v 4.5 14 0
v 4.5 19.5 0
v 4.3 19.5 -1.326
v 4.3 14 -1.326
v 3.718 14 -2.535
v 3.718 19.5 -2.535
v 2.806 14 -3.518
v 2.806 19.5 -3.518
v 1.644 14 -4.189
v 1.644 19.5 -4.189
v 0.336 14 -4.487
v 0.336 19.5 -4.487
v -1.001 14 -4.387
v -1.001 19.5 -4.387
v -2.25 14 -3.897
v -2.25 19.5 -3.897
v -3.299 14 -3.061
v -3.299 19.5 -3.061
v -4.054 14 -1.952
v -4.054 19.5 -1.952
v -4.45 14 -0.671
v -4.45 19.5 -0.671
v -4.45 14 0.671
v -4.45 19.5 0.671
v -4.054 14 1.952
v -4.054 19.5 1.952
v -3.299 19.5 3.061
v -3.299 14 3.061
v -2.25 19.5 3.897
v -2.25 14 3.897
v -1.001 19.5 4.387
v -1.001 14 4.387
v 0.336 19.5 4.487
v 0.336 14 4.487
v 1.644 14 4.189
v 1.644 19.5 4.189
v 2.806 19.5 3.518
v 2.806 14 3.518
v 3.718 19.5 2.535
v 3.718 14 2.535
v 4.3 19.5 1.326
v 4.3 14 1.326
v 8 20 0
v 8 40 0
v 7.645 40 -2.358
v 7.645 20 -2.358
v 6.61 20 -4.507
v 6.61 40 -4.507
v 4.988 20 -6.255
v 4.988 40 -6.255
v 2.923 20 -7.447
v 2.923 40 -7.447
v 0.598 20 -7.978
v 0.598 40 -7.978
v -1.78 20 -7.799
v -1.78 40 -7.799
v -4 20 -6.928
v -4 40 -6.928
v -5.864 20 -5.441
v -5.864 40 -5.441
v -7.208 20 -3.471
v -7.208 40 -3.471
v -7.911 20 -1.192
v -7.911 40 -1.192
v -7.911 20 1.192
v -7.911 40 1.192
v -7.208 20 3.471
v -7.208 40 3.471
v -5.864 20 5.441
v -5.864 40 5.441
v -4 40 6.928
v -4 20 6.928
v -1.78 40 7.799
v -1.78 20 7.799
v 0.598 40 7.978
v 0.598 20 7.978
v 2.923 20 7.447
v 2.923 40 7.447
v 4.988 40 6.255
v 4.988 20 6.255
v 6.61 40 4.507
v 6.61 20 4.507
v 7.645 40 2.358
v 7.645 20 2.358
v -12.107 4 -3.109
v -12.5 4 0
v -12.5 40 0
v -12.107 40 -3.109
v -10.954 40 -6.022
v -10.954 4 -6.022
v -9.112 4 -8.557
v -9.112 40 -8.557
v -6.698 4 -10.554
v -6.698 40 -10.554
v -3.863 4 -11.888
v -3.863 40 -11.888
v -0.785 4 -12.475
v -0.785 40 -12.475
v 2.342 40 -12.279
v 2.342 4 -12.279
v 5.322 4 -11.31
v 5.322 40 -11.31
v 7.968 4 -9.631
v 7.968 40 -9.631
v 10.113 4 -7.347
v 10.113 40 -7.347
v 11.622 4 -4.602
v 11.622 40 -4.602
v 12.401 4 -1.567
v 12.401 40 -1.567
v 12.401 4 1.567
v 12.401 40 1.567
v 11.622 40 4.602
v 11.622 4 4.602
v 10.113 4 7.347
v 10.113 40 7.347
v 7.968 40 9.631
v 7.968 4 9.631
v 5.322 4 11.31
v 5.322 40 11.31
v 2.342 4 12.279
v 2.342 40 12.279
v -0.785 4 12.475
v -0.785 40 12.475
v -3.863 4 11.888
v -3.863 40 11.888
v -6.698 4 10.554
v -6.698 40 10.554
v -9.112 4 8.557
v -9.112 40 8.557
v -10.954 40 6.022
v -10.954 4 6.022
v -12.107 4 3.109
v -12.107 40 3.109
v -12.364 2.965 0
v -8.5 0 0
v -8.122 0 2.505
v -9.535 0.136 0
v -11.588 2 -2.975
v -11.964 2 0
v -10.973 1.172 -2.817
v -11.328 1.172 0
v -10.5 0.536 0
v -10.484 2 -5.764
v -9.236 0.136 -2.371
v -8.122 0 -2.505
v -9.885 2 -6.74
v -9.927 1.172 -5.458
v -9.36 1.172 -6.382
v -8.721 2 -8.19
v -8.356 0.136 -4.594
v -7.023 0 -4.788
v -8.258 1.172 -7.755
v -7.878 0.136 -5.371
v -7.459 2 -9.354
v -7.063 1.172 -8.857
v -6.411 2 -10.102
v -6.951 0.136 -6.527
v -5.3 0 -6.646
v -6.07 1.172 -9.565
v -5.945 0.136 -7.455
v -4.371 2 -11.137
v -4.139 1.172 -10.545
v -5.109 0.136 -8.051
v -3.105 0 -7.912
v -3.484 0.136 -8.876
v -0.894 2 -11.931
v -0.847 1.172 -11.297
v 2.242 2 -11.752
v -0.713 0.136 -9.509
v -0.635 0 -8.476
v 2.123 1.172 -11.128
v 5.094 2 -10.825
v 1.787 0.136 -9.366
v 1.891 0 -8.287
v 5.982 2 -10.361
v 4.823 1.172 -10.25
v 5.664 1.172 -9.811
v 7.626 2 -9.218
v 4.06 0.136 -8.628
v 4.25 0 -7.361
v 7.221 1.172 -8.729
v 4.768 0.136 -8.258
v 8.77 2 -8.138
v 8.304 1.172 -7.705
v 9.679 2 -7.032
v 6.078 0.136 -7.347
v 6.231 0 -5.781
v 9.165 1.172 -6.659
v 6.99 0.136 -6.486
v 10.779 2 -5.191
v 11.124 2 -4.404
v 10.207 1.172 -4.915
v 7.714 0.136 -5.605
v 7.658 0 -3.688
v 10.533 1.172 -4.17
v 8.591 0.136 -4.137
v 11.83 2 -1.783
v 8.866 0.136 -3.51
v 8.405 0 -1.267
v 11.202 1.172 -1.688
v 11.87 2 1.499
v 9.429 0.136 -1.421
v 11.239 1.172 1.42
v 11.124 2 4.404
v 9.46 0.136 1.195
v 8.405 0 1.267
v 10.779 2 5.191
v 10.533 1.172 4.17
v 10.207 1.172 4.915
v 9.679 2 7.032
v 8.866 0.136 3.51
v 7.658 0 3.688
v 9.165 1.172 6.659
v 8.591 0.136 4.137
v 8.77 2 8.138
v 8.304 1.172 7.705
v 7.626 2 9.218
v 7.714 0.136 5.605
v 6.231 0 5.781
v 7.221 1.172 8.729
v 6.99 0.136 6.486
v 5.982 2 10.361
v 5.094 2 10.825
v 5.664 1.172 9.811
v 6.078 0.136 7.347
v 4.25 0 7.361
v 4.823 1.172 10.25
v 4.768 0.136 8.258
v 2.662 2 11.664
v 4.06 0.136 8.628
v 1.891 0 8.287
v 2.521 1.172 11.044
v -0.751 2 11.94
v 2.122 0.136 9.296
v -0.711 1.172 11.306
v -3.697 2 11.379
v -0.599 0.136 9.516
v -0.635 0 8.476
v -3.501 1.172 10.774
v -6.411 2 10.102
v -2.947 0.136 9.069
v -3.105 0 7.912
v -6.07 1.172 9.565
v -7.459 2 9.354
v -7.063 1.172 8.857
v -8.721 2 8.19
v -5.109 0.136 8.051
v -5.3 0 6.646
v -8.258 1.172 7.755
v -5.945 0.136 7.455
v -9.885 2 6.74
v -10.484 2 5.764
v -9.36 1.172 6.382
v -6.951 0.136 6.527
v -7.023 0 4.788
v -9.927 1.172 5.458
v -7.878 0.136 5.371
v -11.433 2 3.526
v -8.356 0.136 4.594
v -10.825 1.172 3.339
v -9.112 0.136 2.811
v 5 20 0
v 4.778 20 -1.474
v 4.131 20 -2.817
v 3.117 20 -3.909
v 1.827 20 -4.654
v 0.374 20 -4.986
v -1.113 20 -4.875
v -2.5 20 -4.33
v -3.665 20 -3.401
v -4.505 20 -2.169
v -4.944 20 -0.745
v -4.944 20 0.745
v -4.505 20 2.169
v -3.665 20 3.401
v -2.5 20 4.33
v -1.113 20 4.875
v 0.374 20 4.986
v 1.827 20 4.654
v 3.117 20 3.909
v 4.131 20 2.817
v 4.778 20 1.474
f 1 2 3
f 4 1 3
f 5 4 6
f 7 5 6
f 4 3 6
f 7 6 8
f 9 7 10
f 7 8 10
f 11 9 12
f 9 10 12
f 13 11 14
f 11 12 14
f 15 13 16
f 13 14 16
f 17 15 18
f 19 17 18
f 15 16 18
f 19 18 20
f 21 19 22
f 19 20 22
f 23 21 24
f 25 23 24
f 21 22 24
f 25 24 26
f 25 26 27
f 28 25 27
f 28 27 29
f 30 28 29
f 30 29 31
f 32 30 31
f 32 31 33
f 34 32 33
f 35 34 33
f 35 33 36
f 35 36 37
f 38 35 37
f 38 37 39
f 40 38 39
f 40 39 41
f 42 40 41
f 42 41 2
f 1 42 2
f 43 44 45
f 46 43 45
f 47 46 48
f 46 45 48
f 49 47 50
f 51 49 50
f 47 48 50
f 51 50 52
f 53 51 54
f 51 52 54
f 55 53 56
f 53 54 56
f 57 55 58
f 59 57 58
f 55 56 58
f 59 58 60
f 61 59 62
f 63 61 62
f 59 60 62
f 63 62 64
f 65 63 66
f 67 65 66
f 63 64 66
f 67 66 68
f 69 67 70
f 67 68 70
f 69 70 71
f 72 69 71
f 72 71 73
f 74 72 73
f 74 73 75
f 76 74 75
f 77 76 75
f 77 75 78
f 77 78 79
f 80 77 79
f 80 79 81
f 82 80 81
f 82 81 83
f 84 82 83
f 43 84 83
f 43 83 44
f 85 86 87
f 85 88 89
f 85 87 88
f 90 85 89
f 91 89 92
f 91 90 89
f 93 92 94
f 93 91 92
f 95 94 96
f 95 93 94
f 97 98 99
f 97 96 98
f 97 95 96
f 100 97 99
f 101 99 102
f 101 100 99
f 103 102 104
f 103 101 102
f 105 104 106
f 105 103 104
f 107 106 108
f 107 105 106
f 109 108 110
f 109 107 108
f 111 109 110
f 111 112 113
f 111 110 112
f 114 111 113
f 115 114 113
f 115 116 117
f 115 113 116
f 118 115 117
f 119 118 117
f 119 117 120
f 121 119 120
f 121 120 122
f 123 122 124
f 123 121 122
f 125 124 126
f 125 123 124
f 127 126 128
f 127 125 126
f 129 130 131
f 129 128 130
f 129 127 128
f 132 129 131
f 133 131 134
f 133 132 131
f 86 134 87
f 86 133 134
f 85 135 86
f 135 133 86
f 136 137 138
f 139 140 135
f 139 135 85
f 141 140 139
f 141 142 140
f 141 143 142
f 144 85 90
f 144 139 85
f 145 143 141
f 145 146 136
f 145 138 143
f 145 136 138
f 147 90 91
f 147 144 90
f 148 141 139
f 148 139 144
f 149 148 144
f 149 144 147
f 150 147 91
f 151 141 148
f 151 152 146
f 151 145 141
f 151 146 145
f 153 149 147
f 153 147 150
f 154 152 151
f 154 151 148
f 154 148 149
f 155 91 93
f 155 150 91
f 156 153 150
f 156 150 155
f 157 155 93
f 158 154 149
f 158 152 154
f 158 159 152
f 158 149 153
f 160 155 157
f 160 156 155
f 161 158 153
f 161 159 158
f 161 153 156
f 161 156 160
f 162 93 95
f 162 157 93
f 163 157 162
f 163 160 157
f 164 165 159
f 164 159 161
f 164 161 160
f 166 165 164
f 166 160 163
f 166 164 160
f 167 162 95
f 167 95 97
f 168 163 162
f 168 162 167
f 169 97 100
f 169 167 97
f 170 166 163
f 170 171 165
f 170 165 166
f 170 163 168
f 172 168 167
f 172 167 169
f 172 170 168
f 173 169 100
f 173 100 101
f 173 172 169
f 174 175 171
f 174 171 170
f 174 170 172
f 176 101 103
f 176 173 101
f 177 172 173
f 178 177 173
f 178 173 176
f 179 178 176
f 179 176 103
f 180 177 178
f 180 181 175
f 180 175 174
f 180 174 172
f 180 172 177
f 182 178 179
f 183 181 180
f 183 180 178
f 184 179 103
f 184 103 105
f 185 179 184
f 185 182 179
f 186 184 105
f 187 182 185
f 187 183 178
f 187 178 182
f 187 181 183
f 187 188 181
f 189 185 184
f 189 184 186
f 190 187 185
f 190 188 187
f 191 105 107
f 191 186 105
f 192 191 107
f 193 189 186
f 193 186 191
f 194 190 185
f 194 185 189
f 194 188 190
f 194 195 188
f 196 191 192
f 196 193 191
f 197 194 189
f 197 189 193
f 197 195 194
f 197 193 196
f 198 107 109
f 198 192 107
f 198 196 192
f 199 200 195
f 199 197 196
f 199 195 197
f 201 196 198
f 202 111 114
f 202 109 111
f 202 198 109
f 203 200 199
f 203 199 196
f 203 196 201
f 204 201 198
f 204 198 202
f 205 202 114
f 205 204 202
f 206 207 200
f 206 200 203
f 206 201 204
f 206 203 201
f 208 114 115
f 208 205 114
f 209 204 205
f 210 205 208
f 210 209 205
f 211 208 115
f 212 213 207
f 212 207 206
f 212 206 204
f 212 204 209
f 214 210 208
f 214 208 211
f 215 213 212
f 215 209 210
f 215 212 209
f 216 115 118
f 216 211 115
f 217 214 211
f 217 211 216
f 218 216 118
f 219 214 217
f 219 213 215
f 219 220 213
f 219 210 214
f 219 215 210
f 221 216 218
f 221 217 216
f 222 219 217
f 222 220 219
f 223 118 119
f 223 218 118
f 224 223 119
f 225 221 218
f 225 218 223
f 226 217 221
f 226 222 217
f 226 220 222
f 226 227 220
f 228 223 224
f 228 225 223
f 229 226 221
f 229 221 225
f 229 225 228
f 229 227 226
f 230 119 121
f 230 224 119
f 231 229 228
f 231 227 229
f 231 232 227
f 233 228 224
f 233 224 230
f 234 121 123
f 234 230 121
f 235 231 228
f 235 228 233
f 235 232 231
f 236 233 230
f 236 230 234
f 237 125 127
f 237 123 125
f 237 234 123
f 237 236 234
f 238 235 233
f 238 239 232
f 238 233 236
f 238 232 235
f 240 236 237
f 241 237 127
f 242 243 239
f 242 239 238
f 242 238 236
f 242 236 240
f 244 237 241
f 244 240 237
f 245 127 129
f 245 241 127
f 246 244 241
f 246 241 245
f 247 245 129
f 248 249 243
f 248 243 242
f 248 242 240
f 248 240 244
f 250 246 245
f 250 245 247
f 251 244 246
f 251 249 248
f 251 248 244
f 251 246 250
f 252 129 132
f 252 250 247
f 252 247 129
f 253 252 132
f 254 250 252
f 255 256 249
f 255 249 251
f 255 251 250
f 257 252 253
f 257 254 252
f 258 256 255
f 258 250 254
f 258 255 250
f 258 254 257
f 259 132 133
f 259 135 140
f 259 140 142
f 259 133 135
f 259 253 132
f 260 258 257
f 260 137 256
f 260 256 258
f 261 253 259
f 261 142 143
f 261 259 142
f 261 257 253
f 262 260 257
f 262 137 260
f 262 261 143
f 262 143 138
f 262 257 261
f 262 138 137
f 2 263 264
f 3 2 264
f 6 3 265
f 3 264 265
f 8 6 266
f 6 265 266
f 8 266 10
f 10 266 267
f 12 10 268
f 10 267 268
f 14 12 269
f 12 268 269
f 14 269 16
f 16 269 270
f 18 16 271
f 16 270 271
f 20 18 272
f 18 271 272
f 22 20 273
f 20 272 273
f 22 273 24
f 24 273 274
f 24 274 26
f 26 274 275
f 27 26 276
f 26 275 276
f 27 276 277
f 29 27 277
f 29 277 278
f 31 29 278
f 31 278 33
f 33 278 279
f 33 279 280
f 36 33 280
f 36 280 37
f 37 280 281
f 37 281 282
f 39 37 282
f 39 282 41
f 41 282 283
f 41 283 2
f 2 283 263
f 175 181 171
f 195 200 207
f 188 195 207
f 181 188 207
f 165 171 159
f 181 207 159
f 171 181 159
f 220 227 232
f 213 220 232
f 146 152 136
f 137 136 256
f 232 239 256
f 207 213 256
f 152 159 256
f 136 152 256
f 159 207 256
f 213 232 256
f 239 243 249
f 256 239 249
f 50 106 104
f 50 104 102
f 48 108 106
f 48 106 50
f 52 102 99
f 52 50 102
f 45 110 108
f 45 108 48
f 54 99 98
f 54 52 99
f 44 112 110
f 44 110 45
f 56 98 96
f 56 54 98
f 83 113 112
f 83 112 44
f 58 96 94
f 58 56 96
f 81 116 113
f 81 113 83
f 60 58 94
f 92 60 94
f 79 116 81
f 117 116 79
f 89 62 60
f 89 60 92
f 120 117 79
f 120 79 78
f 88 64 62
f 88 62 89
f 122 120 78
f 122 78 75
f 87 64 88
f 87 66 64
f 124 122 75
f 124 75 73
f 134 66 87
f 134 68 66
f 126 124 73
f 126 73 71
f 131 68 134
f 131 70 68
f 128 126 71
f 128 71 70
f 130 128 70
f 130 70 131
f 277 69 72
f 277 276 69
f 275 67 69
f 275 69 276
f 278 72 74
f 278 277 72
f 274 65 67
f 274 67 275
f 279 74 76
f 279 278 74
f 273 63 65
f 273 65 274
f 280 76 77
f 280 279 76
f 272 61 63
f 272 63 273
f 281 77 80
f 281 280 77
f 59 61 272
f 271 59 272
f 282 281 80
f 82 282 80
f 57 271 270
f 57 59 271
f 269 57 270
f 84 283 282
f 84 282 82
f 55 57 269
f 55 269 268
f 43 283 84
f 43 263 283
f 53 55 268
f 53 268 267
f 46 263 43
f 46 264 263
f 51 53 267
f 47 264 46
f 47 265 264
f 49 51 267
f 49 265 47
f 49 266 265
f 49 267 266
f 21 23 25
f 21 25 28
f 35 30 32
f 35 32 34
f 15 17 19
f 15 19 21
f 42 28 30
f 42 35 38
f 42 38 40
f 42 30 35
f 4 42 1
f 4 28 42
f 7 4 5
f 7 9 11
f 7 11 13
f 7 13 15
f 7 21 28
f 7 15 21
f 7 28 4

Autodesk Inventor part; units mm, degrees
ref_plane "YZ Plane" through (0, 0, 0) normal (1, 0, 0) x (0, 1, 0)
ref_plane "XZ Plane" through (0, 0, 0) normal (0, 1, 0) x (-1, 0, 0)
ref_plane "XY Plane" through (0, 0, 0) normal (0, 0, 1) x (1, 0, 0)
sketch "Szkic1" plane through (0, 0, 0) normal (0, 1, 0) x (-1, 0, 0)
  circle A0 centre (0, 0) radius 12.5
  dimension "d0" = 25
extrude "Wyciągnięcie proste1" add sketch "Szkic1" along normal blind 40
fillet "Zaokrąglenie1" radius 4 1 edges at (12.5, 0, 0)
sketch "Szkic2" plane through (0, 40, 0) normal (0, 1, 0) x (1, 0, 0)
  circle A0 centre (0, 0) radius 12.5 projected
  circle A1 centre (0, 0) radius 8
  dimension "d4" = 16
extrude "Wyciągnięcie proste2" cut sketch "Szkic2" against normal blind 20 contours A1
sketch "Szkic3" plane through (0, 20, 0) normal (0, 1, 0) x (1, 0, 0)
  circle A0 centre (0, 0) radius 8 projected
  circle A1 centre (0, 0) radius 4.5
  dimension "d7" = 9
extrude "Wyciągnięcie proste3" cut sketch "Szkic3" against normal blind 6 contours A1
chamfer "Faza1" distance 0.5 angle 45 1 edges at (-4.5, 20, 0)
properties part number "koncowka do laski - walec zaokraglony"
